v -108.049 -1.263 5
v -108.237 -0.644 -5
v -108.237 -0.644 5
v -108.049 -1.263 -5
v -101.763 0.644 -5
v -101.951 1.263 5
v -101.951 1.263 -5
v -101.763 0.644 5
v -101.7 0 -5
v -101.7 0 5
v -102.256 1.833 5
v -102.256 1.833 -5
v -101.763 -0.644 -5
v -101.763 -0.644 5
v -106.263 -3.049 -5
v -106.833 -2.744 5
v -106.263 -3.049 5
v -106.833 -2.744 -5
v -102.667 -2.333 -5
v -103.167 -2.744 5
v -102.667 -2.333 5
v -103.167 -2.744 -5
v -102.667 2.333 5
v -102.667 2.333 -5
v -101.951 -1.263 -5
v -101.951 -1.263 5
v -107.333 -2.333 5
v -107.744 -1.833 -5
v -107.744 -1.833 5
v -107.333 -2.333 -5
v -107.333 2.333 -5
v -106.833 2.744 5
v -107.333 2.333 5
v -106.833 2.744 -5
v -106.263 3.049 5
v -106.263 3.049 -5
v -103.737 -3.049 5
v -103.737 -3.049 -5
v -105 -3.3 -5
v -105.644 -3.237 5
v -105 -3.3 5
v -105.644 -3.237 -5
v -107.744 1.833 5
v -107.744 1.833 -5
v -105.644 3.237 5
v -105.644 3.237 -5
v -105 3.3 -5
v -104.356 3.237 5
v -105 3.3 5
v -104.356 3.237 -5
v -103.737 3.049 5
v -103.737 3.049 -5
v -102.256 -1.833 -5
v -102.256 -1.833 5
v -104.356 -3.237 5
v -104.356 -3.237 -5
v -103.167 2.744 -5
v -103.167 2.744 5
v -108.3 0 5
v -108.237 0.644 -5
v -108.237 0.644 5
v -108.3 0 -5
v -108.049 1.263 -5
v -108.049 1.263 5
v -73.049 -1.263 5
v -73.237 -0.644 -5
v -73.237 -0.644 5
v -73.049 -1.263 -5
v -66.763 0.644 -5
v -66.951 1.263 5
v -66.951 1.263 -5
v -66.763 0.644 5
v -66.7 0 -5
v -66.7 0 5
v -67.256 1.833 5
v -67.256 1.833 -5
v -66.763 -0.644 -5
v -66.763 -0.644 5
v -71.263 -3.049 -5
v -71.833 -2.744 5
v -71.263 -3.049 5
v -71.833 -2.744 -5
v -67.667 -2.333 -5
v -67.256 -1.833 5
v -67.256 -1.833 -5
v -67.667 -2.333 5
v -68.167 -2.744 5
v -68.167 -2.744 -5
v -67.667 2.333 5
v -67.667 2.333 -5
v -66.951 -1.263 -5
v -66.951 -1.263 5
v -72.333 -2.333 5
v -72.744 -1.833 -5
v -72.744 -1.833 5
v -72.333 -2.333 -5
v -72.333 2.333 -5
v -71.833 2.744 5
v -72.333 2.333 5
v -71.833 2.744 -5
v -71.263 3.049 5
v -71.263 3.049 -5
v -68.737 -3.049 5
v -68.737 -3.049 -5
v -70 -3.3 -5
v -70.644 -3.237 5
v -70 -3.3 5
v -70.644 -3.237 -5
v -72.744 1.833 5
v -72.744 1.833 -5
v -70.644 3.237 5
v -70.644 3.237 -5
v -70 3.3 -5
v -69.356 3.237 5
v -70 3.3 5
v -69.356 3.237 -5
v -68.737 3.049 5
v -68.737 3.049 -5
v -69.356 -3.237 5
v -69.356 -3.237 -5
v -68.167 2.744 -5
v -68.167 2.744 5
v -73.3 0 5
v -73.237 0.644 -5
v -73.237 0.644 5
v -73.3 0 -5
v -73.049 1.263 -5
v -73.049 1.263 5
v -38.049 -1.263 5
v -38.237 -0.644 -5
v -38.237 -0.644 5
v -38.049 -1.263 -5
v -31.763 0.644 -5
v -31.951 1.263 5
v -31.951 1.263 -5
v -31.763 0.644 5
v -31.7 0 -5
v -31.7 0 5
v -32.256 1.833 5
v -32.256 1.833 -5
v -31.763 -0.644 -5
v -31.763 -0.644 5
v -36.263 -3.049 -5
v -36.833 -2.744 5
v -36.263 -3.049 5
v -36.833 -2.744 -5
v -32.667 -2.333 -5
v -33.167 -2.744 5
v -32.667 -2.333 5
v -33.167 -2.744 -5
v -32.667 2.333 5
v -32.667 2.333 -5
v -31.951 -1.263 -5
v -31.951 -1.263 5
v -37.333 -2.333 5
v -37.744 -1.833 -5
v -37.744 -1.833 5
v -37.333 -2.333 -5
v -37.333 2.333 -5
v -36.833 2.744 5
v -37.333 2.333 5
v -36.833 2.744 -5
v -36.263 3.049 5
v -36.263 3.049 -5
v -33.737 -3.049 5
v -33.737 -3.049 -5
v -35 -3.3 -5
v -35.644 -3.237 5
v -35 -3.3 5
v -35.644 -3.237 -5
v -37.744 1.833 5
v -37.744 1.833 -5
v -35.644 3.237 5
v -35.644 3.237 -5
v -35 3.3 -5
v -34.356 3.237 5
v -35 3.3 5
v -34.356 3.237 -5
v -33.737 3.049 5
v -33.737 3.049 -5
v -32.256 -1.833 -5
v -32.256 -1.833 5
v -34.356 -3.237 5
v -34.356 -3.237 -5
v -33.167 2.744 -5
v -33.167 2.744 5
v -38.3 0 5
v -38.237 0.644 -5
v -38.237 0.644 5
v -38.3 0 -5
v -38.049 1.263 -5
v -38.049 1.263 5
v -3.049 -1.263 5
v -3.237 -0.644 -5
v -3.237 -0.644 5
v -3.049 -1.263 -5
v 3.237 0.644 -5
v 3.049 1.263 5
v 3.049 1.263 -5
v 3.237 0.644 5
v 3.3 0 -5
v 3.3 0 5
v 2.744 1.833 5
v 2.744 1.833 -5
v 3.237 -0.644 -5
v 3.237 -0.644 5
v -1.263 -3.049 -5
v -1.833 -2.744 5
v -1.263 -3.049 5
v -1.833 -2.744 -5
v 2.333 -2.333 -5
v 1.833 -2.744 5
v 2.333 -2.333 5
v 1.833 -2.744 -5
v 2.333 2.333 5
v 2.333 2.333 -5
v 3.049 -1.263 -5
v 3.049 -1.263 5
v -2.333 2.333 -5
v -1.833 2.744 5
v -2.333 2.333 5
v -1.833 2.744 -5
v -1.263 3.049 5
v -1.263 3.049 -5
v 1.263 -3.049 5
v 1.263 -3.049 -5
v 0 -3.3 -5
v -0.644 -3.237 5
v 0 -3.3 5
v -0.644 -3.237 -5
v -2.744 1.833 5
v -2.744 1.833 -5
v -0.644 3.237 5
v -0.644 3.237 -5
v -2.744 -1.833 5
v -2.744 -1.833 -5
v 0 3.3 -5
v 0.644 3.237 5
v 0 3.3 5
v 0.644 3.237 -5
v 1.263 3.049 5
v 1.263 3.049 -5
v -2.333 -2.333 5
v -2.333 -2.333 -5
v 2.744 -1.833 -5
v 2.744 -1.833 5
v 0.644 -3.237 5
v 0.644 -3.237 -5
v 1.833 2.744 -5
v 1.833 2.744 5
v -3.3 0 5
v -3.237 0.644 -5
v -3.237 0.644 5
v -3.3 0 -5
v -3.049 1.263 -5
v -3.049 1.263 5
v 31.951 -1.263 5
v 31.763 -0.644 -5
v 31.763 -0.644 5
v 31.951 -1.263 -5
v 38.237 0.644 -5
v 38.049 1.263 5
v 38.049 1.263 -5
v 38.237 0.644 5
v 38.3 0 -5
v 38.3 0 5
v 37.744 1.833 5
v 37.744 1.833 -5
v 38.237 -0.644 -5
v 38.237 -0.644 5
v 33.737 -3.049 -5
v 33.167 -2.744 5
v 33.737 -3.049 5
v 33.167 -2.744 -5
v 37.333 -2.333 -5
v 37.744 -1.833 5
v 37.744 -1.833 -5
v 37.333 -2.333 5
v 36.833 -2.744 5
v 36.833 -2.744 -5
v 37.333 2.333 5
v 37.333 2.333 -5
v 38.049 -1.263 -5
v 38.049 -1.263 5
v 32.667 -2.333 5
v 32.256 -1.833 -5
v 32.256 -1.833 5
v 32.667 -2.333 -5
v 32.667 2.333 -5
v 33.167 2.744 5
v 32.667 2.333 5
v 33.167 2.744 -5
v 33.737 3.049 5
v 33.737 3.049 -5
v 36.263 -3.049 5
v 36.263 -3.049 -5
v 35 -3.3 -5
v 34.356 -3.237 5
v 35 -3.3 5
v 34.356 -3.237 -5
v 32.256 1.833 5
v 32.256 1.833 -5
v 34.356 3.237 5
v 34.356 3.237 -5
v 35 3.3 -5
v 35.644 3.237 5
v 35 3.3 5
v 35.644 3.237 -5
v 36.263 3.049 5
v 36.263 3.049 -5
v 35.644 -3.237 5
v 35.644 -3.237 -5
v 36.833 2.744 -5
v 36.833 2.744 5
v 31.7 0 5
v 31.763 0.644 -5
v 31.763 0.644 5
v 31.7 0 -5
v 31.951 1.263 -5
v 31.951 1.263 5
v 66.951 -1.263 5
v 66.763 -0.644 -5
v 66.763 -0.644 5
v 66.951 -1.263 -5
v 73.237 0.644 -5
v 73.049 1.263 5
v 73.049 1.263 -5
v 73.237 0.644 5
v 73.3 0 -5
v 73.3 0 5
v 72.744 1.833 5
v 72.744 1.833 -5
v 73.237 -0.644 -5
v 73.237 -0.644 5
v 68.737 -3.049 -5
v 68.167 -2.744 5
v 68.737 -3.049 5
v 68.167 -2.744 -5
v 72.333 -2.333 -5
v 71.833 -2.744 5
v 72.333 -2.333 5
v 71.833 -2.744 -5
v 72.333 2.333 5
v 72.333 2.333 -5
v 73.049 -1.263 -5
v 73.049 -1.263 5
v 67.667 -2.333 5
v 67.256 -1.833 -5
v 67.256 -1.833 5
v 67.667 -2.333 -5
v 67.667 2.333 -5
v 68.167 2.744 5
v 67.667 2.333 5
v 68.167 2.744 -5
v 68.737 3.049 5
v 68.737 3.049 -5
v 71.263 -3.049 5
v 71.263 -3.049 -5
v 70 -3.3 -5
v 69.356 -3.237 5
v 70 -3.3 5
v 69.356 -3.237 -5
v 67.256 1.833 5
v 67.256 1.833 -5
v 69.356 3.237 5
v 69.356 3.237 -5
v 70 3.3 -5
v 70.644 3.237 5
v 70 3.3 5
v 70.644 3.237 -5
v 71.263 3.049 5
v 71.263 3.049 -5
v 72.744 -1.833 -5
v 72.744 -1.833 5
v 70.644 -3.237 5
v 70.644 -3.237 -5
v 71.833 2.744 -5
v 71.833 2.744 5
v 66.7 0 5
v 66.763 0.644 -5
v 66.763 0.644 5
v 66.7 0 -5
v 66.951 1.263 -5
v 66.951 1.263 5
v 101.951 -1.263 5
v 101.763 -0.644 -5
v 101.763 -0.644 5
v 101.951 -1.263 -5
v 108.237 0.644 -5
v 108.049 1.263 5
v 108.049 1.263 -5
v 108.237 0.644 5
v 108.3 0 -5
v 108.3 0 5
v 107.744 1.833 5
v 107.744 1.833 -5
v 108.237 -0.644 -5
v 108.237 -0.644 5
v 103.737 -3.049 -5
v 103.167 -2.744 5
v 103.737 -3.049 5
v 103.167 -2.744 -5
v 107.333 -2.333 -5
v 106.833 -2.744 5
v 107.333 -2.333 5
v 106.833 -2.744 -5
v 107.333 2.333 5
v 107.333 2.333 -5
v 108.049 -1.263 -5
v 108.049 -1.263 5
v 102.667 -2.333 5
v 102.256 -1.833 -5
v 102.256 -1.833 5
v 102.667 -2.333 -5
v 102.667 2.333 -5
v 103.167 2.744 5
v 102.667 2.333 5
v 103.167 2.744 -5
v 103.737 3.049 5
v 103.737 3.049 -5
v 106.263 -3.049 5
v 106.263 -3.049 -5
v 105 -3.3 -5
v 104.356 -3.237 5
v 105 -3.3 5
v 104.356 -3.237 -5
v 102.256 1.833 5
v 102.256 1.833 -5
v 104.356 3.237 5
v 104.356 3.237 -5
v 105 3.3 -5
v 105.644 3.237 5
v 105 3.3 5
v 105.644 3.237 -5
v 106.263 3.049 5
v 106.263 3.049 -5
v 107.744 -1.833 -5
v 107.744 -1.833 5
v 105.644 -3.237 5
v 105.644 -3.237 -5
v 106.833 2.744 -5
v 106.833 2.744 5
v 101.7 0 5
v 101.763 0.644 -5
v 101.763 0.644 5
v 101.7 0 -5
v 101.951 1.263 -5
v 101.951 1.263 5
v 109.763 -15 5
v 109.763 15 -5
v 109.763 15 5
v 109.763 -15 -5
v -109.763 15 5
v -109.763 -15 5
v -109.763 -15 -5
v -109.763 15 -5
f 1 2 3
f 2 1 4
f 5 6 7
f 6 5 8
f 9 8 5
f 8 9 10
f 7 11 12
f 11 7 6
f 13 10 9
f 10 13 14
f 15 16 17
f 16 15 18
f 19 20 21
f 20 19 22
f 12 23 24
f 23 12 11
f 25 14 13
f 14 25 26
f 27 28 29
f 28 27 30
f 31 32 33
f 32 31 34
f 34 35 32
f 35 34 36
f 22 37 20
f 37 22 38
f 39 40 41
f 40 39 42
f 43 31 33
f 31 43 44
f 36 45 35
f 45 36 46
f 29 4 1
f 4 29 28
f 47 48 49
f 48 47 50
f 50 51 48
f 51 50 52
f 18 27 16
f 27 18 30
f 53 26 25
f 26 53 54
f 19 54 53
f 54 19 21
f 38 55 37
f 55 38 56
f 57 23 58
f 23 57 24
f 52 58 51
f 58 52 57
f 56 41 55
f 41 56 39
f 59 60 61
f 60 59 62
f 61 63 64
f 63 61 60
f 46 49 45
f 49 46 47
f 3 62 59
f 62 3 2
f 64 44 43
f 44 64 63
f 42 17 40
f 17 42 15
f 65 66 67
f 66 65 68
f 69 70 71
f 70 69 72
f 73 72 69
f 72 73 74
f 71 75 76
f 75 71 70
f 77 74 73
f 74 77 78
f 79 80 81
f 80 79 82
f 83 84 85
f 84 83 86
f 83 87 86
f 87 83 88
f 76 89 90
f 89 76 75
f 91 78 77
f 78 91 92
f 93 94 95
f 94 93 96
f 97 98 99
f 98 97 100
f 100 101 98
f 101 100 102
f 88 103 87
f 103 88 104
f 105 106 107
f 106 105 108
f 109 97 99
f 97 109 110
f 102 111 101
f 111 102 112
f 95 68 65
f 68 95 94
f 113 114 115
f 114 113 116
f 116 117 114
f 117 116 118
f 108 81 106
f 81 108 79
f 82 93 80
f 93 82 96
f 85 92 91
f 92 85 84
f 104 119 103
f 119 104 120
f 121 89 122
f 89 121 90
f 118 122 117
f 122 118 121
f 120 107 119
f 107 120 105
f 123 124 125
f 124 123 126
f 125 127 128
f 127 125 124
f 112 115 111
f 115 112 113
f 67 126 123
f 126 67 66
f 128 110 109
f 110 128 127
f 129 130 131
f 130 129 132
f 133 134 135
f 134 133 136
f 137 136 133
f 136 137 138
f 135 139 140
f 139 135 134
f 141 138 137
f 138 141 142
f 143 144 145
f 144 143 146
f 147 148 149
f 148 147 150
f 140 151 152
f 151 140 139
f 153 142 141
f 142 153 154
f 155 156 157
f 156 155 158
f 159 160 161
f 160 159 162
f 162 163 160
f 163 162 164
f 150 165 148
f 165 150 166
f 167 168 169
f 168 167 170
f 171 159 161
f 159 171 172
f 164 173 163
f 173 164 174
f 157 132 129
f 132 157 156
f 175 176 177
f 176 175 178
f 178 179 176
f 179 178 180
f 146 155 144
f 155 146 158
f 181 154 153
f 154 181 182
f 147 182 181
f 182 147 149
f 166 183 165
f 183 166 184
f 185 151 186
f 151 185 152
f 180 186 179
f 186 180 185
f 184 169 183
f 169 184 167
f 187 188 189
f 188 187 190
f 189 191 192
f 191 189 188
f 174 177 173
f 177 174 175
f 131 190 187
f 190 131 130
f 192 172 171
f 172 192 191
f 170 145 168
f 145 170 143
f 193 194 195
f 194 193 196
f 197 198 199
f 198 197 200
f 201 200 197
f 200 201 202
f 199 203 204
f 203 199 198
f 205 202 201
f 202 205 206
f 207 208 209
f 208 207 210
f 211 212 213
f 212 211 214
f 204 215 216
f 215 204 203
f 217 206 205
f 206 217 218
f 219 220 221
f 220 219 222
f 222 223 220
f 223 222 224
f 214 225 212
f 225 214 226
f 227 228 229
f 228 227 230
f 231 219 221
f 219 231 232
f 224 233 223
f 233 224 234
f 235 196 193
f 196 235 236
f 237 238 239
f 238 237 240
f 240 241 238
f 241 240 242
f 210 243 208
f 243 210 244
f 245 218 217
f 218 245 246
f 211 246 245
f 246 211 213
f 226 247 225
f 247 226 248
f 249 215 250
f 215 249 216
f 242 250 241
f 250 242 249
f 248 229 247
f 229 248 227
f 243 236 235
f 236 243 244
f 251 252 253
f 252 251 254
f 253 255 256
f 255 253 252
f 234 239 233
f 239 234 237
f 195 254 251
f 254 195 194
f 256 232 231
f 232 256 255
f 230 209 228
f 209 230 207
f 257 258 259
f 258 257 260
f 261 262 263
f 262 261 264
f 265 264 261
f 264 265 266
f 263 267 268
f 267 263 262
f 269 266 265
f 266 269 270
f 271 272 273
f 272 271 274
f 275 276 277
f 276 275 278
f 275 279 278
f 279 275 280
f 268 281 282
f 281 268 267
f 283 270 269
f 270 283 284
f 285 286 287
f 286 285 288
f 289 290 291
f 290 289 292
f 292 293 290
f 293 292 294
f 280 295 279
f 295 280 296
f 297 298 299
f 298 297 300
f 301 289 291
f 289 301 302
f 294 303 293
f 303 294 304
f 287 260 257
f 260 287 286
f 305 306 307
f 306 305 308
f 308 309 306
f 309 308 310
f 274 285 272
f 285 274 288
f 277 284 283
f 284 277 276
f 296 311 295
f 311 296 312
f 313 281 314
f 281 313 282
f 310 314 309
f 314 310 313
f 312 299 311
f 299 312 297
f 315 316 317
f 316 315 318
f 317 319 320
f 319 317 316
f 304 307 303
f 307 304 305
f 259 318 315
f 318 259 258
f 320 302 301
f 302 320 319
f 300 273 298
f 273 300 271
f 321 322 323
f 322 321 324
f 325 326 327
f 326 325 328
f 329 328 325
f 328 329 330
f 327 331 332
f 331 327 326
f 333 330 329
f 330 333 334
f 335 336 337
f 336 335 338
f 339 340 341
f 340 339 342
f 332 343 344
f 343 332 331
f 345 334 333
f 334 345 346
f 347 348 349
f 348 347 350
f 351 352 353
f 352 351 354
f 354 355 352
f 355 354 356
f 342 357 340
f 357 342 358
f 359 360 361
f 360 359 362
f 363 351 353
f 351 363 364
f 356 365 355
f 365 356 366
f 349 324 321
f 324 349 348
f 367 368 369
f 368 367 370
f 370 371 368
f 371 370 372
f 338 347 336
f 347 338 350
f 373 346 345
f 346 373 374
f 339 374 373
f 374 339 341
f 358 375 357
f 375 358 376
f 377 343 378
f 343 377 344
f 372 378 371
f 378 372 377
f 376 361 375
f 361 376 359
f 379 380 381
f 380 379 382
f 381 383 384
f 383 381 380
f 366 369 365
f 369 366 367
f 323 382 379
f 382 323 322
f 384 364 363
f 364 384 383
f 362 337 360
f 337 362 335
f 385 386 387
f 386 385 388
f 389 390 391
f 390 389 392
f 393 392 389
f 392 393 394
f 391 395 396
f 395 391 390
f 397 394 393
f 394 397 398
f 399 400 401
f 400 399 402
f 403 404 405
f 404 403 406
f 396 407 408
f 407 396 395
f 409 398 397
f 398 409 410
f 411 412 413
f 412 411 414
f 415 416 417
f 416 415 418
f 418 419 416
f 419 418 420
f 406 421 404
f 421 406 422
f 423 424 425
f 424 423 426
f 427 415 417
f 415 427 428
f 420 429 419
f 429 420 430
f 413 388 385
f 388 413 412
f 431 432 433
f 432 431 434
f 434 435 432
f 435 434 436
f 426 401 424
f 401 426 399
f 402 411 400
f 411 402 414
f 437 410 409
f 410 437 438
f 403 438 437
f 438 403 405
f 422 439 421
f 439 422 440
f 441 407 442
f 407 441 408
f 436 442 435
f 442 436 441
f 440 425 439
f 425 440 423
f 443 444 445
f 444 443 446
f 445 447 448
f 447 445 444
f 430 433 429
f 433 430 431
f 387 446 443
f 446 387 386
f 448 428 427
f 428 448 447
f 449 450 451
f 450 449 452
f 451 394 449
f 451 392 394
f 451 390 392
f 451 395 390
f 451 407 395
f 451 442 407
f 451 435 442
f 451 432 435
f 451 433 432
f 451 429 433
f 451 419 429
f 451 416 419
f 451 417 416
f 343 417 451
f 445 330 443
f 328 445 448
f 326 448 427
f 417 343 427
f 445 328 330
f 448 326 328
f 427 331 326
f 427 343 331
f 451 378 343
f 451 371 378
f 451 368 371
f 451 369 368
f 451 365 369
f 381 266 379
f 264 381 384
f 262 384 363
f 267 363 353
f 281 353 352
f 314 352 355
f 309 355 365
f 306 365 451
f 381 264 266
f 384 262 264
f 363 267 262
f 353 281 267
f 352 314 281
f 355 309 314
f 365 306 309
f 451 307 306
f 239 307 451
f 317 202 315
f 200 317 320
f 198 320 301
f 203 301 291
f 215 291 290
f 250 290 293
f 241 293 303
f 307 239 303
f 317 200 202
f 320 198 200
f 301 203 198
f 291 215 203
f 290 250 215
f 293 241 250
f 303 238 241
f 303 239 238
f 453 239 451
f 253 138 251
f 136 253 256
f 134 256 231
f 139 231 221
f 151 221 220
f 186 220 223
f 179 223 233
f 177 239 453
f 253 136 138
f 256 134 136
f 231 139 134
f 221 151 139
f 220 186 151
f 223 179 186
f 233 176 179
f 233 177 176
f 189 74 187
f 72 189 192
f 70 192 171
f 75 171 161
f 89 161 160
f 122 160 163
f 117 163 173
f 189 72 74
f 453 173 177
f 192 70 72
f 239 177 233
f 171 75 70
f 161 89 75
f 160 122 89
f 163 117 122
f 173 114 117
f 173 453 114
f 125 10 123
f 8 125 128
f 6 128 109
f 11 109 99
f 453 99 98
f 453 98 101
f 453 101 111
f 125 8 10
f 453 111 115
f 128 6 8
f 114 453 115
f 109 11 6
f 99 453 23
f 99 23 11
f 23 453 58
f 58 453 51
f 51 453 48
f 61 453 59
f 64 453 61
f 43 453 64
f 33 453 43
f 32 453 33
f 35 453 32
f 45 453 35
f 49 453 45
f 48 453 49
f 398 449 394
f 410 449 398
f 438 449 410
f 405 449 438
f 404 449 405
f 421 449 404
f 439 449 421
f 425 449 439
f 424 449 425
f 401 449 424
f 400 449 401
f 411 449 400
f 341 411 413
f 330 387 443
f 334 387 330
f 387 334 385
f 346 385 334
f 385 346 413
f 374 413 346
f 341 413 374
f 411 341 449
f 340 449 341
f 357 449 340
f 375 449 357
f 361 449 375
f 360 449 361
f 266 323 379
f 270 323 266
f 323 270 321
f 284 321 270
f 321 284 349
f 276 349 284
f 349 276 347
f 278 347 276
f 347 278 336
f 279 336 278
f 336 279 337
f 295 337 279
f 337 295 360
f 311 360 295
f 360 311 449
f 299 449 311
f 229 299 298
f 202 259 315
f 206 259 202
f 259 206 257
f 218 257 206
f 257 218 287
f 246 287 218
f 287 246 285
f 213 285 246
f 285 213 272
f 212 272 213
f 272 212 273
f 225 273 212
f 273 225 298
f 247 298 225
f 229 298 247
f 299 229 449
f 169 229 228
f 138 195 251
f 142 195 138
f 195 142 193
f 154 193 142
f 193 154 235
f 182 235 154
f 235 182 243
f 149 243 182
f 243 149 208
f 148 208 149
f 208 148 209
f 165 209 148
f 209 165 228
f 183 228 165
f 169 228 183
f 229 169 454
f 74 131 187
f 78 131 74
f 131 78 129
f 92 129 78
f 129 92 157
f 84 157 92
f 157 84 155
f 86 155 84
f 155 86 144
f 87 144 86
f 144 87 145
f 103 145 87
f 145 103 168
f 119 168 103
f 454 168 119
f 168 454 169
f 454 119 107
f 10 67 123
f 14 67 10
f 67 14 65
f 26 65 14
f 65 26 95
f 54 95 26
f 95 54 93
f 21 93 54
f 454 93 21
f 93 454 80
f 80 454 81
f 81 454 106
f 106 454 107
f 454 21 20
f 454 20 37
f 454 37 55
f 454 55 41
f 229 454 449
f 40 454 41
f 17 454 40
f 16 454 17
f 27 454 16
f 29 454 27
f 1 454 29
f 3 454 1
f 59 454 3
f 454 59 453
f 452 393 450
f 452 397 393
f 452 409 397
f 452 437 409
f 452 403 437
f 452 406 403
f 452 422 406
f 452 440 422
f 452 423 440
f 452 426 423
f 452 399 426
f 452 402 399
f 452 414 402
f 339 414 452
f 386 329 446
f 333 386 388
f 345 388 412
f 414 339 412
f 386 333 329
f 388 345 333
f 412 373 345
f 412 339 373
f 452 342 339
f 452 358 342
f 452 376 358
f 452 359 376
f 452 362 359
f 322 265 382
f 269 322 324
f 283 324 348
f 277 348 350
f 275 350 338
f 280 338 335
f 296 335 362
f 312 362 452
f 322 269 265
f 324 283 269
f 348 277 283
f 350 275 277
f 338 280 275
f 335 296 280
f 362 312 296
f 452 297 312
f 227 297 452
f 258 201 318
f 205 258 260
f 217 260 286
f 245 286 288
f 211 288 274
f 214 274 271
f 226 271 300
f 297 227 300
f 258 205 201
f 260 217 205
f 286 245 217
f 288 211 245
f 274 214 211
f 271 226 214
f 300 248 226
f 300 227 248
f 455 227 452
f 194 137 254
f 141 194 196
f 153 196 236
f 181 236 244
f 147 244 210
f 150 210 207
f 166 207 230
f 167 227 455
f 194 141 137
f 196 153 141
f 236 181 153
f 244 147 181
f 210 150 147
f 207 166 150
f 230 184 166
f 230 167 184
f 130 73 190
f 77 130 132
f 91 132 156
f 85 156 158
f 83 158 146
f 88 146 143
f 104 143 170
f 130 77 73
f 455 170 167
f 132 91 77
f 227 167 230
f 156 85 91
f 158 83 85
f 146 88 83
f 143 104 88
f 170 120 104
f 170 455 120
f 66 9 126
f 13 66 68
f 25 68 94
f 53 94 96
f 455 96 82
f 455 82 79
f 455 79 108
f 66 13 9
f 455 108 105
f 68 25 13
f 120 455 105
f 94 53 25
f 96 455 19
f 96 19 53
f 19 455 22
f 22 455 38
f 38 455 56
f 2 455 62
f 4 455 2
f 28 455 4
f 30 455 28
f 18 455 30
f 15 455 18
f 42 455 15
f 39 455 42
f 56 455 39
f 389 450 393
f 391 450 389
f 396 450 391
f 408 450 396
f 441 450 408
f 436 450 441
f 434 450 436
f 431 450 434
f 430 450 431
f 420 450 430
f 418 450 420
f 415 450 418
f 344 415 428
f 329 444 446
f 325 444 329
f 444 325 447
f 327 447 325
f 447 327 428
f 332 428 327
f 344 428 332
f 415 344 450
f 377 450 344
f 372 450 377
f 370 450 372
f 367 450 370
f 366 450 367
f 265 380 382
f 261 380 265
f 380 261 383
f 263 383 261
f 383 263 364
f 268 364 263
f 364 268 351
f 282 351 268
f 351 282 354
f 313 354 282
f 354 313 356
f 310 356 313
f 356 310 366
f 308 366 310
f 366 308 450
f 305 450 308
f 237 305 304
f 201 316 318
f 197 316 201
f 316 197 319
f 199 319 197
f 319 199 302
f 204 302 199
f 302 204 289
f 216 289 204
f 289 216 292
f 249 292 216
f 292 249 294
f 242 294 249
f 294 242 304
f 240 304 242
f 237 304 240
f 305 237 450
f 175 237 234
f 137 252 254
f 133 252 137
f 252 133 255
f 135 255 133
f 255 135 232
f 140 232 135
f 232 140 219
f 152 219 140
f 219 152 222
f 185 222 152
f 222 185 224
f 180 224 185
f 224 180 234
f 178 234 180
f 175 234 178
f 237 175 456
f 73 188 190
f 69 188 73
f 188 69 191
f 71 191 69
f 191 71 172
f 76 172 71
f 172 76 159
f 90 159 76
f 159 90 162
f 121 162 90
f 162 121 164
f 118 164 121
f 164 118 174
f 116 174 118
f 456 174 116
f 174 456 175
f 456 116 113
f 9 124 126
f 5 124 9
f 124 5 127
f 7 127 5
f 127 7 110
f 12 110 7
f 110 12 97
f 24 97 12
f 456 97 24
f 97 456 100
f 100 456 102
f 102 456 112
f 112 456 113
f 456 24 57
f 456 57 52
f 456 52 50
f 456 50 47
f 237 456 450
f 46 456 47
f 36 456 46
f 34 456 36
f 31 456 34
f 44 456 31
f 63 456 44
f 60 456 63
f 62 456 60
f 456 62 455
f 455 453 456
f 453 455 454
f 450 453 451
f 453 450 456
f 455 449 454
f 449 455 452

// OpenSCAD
$fn = 32;

// ----------------------------------------------------------------------
// Hole bar, 7 x Ø6.6
// row layout, 4.7625 mm edge offset
// ----------------------------------------------------------------------

// --- parameters (mm) ---
bar_w = 30;    // bar width (Y)
bar_t = 10;    // bar thickness (Z)
holes = 7;     // holes per row
hole_d = 6.6;  // hole diameter
edge = 4.763;  // offset from the bar end to the first hole
pitch = 35;    // pitch between neighbouring holes

// --- derived feature positions (mm) ---
span = (holes - 1) * pitch;   // = 210   distance between the end holes
bar_l = span + 2 * edge;      // = 219.53   overall bar length
start_x = -bar_l / 2 + edge;  // = -105   X of the first hole
feature_centers = [
  [start_x + 0 * pitch, 0],
  [start_x + 1 * pitch, 0],
  [start_x + 2 * pitch, 0],
  [start_x + 3 * pitch, 0],
  [start_x + 4 * pitch, 0],
  [start_x + 5 * pitch, 0],
  [start_x + 6 * pitch, 0]
];   // hole centres of the first row

// bar with one row of holes, drilled from feature_centers
difference() {
  translate([-bar_l / 2, -bar_w / 2, -bar_t / 2]) cube([bar_l, bar_w, bar_t]);
  for (centre = feature_centers)
    translate([centre[0], centre[1], 0])
      cylinder(d = hole_d, h = bar_t + 2, center = true);
}
